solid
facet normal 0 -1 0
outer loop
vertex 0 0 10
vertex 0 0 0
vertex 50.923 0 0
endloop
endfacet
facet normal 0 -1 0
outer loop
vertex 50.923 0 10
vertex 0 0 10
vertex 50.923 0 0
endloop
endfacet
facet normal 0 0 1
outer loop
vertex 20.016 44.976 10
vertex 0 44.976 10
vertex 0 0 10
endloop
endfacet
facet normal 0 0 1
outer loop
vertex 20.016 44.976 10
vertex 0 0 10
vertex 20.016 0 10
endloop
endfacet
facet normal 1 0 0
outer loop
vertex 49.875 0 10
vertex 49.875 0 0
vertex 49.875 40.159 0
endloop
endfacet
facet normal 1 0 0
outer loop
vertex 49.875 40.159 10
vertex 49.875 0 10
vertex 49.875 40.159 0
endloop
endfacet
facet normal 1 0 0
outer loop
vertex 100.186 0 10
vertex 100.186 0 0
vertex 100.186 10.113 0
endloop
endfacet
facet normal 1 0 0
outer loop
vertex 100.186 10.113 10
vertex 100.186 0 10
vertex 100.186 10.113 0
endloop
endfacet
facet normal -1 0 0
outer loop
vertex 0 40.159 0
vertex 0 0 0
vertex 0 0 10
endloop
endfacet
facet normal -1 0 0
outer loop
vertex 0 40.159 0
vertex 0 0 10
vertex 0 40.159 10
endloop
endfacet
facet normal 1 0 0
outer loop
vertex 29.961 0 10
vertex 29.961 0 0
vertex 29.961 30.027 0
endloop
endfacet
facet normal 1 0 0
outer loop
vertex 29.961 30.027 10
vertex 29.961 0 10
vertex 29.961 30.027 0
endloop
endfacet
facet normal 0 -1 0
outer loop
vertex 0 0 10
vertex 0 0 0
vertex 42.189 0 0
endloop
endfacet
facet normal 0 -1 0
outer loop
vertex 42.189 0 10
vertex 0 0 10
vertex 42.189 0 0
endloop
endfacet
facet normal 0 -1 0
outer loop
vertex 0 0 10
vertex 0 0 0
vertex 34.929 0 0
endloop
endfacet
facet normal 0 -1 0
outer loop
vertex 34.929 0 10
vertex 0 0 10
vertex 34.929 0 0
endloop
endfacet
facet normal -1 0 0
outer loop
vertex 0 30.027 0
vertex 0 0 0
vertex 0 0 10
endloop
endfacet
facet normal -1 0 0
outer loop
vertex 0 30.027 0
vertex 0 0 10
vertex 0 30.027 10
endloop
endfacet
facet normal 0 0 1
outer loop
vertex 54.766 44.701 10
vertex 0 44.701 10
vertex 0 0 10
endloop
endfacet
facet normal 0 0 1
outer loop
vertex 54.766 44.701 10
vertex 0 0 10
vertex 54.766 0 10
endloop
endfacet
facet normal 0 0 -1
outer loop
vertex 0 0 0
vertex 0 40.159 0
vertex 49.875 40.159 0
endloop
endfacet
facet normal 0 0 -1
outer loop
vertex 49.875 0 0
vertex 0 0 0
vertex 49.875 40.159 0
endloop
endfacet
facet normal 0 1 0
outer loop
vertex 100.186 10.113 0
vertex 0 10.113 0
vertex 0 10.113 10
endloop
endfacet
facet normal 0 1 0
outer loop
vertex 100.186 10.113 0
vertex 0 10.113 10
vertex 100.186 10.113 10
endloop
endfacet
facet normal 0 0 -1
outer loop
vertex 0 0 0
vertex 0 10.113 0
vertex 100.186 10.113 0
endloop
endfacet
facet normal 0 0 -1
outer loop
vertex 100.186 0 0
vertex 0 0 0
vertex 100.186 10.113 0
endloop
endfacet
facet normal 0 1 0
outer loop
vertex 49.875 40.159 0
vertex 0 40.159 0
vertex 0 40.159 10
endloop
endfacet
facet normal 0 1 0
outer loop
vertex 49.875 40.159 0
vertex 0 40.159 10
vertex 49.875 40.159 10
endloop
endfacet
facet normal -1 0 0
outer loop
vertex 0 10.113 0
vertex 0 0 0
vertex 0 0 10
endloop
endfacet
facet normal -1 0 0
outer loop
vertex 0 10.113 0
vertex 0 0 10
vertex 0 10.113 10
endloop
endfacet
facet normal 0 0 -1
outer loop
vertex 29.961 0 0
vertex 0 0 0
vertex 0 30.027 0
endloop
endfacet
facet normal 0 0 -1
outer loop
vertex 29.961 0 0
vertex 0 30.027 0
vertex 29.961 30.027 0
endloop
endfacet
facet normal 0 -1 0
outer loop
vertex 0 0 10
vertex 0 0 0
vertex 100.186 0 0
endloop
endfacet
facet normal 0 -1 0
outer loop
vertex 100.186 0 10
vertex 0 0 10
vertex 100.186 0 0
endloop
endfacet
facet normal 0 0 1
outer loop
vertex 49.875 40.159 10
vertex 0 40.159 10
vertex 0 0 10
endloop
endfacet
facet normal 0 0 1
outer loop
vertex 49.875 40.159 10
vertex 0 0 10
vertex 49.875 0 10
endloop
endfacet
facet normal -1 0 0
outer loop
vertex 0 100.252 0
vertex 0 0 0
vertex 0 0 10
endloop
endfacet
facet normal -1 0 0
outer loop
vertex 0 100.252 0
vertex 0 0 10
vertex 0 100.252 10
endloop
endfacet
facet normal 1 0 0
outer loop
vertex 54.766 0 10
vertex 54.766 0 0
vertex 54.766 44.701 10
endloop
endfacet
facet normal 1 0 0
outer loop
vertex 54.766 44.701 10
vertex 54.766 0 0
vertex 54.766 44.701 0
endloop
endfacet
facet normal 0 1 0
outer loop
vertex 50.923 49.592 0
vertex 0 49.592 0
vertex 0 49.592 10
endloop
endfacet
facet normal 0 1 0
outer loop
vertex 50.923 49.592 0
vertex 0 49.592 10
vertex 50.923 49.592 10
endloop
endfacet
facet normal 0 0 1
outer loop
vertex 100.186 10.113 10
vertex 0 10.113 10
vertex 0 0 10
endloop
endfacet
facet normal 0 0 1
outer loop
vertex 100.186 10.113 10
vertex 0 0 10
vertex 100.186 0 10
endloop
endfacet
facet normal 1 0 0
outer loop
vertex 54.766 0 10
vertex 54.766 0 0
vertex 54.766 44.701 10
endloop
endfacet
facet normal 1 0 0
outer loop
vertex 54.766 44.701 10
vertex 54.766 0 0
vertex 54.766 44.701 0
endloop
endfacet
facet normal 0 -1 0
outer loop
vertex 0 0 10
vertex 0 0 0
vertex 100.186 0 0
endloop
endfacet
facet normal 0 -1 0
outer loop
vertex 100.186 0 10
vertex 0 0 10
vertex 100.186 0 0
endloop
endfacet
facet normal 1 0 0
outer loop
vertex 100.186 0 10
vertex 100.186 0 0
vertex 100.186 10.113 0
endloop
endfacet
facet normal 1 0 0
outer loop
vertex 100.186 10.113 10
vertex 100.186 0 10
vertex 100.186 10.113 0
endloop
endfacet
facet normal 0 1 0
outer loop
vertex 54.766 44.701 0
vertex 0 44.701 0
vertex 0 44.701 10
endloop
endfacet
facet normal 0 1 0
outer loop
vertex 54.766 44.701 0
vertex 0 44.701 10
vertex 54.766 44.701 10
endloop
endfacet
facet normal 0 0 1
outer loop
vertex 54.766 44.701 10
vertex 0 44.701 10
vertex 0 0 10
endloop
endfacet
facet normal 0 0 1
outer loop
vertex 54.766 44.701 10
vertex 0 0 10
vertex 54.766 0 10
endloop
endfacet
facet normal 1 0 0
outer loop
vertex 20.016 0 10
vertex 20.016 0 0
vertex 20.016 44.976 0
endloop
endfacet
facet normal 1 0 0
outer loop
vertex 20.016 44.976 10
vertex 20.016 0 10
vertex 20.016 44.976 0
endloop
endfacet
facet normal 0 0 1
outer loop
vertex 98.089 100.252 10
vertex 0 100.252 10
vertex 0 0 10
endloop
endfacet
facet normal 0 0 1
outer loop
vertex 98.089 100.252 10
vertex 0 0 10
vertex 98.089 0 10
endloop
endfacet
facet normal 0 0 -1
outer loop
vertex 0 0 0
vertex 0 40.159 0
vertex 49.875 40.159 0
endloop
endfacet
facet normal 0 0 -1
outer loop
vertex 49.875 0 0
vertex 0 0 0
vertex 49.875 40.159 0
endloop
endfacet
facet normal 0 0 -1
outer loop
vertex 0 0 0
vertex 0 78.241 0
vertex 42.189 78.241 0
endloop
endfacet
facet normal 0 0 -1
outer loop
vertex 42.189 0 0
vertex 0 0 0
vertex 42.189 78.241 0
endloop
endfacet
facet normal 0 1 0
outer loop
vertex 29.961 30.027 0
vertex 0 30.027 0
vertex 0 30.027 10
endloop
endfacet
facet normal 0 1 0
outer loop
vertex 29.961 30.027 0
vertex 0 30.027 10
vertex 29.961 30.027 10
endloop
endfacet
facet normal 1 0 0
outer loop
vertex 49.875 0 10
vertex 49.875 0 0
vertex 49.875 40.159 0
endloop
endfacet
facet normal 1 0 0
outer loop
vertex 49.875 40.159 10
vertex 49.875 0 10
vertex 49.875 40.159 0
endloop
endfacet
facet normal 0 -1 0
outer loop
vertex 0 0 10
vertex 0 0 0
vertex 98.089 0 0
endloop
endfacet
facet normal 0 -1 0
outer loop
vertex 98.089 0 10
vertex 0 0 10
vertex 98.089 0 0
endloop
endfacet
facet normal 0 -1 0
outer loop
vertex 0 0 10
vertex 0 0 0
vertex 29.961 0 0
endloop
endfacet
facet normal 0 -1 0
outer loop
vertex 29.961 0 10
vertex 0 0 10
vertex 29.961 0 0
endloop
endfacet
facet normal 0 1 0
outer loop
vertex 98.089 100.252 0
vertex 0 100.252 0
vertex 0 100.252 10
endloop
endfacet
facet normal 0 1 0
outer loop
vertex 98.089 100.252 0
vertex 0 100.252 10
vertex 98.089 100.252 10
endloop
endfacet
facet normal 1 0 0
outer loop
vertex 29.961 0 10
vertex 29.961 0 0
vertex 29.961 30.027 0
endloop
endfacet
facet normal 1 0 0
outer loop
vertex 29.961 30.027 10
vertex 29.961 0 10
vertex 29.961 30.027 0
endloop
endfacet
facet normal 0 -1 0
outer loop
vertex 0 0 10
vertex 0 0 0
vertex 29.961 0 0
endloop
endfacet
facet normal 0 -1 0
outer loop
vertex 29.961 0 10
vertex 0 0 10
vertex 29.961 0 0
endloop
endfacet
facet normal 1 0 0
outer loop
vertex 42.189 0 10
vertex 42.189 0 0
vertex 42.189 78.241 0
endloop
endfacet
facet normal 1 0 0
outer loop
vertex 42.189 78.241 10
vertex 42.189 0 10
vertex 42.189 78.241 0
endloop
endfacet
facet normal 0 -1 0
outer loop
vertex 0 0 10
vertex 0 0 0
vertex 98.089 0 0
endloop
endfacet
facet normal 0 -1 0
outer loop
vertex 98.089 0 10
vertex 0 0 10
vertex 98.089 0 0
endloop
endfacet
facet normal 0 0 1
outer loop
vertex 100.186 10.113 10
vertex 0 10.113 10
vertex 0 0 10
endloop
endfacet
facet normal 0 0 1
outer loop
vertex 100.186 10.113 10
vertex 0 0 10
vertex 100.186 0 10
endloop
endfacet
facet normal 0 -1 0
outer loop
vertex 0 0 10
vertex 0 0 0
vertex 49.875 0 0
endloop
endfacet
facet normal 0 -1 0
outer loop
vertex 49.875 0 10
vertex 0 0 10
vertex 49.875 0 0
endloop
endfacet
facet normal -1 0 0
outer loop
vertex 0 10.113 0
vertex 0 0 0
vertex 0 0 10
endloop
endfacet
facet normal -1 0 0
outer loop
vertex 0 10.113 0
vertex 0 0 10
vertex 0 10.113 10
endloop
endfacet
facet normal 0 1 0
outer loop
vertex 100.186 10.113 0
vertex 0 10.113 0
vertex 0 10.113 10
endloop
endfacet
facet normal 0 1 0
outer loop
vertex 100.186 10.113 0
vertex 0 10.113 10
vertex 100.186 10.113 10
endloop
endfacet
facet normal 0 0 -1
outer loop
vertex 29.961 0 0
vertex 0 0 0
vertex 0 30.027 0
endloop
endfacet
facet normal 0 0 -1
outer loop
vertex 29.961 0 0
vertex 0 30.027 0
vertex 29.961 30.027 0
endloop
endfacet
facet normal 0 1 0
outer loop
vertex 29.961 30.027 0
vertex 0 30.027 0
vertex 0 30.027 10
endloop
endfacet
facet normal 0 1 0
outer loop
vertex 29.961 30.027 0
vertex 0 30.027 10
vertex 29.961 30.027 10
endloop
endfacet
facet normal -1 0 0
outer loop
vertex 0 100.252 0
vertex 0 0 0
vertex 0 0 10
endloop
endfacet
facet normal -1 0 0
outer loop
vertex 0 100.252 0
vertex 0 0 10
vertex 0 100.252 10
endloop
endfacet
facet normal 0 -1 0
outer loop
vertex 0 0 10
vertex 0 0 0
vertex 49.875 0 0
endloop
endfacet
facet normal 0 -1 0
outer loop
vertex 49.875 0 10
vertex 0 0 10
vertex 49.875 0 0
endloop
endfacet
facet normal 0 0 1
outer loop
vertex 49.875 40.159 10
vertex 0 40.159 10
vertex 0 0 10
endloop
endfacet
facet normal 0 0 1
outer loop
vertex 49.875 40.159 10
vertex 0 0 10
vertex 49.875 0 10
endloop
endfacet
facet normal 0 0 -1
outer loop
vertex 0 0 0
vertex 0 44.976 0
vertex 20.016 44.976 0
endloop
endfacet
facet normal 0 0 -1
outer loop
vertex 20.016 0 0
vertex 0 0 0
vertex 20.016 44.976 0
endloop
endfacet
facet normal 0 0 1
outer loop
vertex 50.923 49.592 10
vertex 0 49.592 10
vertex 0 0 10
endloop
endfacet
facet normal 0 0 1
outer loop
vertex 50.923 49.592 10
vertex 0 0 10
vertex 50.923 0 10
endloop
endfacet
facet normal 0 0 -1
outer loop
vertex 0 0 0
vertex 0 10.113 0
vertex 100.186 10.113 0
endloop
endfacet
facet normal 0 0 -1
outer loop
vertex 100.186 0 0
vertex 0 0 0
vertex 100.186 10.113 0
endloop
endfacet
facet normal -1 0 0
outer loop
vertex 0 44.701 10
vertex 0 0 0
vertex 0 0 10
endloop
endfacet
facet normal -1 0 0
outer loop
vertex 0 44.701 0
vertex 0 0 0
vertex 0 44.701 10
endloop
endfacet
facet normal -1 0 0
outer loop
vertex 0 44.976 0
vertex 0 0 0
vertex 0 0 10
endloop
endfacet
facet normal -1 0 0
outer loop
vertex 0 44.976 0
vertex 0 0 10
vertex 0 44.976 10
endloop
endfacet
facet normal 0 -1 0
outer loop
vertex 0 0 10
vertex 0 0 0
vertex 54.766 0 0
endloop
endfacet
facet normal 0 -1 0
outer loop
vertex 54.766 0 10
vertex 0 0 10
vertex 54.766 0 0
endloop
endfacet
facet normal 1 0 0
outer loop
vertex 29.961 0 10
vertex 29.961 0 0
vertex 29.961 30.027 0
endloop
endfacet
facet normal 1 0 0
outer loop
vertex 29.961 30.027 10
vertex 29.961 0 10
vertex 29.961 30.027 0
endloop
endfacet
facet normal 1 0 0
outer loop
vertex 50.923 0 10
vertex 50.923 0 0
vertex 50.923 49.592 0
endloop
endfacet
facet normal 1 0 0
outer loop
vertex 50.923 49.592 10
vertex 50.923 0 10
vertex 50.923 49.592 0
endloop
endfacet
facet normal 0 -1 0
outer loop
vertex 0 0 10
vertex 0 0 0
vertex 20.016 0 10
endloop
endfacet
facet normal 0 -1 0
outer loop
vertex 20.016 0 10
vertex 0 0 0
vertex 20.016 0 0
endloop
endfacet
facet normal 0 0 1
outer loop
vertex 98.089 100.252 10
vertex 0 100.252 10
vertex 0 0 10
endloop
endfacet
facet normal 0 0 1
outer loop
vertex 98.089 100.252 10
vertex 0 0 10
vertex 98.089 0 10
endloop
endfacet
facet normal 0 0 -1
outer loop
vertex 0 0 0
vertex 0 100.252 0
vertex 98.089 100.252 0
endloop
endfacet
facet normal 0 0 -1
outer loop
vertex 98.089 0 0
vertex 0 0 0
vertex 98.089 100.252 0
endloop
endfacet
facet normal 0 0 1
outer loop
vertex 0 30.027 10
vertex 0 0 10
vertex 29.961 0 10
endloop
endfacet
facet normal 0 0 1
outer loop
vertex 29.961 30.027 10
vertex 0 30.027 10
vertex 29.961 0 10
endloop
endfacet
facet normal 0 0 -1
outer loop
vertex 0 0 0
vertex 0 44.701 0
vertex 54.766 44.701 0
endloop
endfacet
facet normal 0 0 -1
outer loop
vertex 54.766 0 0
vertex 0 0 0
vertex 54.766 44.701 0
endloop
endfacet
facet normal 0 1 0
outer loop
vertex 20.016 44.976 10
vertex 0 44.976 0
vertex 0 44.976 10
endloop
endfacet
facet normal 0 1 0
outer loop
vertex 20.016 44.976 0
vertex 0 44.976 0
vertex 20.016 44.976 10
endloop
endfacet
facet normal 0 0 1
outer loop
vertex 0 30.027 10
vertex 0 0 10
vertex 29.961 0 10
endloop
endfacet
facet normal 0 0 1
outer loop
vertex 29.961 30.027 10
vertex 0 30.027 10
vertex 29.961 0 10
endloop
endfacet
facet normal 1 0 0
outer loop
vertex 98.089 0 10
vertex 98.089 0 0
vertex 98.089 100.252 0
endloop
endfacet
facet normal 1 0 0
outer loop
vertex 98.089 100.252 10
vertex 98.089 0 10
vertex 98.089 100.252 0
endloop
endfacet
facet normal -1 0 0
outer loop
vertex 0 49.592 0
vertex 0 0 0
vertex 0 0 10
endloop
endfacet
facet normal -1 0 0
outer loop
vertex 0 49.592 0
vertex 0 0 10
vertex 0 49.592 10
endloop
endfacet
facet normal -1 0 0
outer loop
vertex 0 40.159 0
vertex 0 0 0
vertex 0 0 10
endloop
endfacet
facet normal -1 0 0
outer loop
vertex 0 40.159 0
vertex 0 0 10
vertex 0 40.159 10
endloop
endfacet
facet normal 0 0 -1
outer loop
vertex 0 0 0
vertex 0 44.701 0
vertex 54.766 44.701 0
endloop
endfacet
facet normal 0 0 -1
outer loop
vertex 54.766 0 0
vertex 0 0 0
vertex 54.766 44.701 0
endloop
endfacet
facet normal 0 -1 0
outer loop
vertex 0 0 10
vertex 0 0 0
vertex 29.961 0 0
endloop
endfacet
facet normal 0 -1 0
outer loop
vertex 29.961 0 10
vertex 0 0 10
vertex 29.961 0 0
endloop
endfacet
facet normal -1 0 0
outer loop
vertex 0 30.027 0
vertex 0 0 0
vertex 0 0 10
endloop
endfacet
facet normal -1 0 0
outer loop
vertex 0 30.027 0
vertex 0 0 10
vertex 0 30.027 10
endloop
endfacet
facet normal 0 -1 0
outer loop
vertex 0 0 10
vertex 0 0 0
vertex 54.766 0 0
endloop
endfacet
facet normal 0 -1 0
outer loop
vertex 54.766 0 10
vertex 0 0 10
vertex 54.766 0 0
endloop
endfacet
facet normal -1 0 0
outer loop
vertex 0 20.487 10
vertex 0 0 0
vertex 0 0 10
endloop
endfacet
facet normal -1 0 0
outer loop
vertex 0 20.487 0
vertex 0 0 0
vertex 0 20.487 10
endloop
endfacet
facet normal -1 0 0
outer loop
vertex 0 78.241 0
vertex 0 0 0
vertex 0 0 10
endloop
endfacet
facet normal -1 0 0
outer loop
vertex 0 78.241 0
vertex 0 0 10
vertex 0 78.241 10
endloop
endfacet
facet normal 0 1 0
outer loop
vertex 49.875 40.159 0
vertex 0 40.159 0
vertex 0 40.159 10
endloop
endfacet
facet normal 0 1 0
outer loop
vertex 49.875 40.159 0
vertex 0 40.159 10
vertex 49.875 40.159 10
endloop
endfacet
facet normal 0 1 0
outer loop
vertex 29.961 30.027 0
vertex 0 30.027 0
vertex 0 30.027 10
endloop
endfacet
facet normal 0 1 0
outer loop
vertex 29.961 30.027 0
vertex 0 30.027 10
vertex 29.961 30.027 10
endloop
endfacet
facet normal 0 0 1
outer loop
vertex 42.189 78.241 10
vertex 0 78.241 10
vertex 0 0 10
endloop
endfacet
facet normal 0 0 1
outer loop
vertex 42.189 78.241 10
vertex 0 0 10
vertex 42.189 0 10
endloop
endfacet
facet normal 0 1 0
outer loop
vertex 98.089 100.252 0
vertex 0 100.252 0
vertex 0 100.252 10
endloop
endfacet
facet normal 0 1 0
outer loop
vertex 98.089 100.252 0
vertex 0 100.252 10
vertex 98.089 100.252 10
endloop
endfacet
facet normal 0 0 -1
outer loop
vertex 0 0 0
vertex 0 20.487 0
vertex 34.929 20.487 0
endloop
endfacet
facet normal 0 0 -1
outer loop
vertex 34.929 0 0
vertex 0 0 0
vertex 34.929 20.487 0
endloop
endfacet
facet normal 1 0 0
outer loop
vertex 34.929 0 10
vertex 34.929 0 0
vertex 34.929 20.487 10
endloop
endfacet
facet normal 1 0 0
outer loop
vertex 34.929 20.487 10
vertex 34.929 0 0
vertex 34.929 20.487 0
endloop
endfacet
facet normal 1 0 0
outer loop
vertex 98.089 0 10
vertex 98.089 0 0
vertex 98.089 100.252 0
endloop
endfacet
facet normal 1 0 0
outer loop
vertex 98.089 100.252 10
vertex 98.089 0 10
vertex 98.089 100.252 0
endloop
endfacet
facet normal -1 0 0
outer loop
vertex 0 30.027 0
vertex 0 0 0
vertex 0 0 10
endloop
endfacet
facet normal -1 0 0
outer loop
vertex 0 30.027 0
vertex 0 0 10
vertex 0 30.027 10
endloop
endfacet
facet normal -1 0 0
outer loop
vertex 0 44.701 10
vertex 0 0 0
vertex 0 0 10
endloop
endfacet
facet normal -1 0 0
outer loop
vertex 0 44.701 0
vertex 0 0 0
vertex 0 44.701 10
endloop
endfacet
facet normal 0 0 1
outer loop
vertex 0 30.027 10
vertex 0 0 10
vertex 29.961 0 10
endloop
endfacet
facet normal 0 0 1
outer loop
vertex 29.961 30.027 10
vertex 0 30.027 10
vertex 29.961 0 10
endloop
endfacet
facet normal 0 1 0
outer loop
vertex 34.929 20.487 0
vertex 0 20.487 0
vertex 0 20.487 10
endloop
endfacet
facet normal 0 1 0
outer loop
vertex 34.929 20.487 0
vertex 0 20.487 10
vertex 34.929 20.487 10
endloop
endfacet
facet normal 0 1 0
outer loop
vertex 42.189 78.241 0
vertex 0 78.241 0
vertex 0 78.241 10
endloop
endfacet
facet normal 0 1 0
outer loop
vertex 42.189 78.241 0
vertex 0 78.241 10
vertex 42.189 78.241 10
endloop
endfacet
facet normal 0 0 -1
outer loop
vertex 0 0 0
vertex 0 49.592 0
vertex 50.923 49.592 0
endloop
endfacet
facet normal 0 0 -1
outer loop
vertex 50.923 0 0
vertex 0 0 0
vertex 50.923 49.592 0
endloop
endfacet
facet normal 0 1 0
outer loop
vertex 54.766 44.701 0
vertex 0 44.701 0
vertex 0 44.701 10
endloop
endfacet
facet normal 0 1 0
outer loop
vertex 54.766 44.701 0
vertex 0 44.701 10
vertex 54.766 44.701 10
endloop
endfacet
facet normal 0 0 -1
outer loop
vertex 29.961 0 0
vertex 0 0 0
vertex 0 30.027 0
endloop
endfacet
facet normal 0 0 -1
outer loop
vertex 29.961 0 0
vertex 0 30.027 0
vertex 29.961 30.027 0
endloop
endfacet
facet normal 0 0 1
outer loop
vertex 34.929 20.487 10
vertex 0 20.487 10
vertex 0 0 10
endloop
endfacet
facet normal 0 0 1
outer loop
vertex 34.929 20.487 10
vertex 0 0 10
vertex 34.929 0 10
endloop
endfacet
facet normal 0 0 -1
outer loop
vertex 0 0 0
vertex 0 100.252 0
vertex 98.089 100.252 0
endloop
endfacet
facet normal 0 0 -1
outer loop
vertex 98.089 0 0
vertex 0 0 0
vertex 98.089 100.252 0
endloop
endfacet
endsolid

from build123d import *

# Parameters (mm, degrees)
SKETCH_W     = 34.929359
SKETCH_H     = 20.486658
PAD_DEPTH    = 10
SKETCH001_W  = 20.015697
SKETCH001_H  = 44.976456
PAD001_DEPTH = 10
SKETCH002_W  = 29.960587
SKETCH002_H  = 30.027189
PAD002_DEPTH = 10
SKETCH003_W  = 54.766457
SKETCH003_H  = 44.701084
PAD003_DEPTH = 10
SKETCH004_W  = 42.188831
SKETCH004_H  = 78.241425
PAD004_DEPTH = 10
SKETCH005_W  = 100.185661
SKETCH005_H  = 10.112617
PAD005_DEPTH = 10
SKETCH006_W  = 49.87516
SKETCH006_H  = 40.159164
PAD006_DEPTH = 10
SKETCH007_W  = 98.089394
SKETCH007_H  = 100.252266
PAD007_DEPTH = 10
SKETCH008_W  = 50.923298
SKETCH008_H  = 49.592381
PAD008_DEPTH = 10
SKETCH009_W  = 29.960587
SKETCH009_H  = 30.027189
PAD009_DEPTH = 10
SKETCH010_W  = 49.87516
SKETCH010_H  = 40.159164
PAD010_DEPTH = 10
SKETCH011_W  = 54.766457
SKETCH011_H  = 44.701084
PAD011_DEPTH = 10
SKETCH012_W  = 29.960587
SKETCH012_H  = 30.027189
PAD012_DEPTH = 10
SKETCH013_W  = 100.185661
SKETCH013_H  = 10.112617
PAD013_DEPTH = 10
SKETCH014_W  = 98.089394
SKETCH014_H  = 100.252266
PAD014_DEPTH = 10


with BuildPart() as body:
    # Sketch → Pad (new body)
    with BuildSketch(Plane.XY):
        with Locations((17.464679, 10.243329)):
            Rectangle(SKETCH_W, SKETCH_H)
    extrude(amount=PAD_DEPTH)


with BuildPart() as body001:
    # Sketch001 → Pad001 (new body)
    with BuildSketch(Plane.XY):
        with Locations((10.007848, 22.488228)):
            Rectangle(SKETCH001_W, SKETCH001_H)
    extrude(amount=PAD001_DEPTH)


with BuildPart() as body002:
    # Sketch002 → Pad002 (new body)
    with BuildSketch(Plane.XY):
        with Locations((14.980294, 15.013594)):
            Rectangle(SKETCH002_W, SKETCH002_H)
    extrude(amount=PAD002_DEPTH)


with BuildPart() as body003:
    # Sketch003 → Pad003 (new body)
    with BuildSketch(Plane.XY):
        with Locations((27.383228, 22.350542)):
            Rectangle(SKETCH003_W, SKETCH003_H)
    extrude(amount=PAD003_DEPTH)


with BuildPart() as body004:
    # Sketch004 → Pad004 (new body)
    with BuildSketch(Plane.XY):
        with Locations((21.094416, 39.120712)):
            Rectangle(SKETCH004_W, SKETCH004_H)
    extrude(amount=PAD004_DEPTH)


with BuildPart() as body005:
    # Sketch005 → Pad005 (new body)
    with BuildSketch(Plane.XY):
        with Locations((50.09283, 5.056309)):
            Rectangle(SKETCH005_W, SKETCH005_H)
    extrude(amount=PAD005_DEPTH)


with BuildPart() as body006:
    # Sketch006 → Pad006 (new body)
    with BuildSketch(Plane.XY):
        with Locations((24.93758, 20.079582)):
            Rectangle(SKETCH006_W, SKETCH006_H)
    extrude(amount=PAD006_DEPTH)


with BuildPart() as body007:
    # Sketch007 → Pad007 (new body)
    with BuildSketch(Plane.XY):
        with Locations((49.044697, 50.126133)):
            Rectangle(SKETCH007_W, SKETCH007_H)
    extrude(amount=PAD007_DEPTH)


with BuildPart() as body008:
    # Sketch008 → Pad008 (new body)
    with BuildSketch(Plane.XY):
        with Locations((25.461649, 24.79619)):
            Rectangle(SKETCH008_W, SKETCH008_H)
    extrude(amount=PAD008_DEPTH)


with BuildPart() as body009:
    # Sketch009 → Pad009 (new body)
    with BuildSketch(Plane.XY):
        with Locations((14.980294, 15.013594)):
            Rectangle(SKETCH009_W, SKETCH009_H)
    extrude(amount=PAD009_DEPTH)


with BuildPart() as body010:
    # Sketch010 → Pad010 (new body)
    with BuildSketch(Plane.XY):
        with Locations((24.93758, 20.079582)):
            Rectangle(SKETCH010_W, SKETCH010_H)
    extrude(amount=PAD010_DEPTH)


with BuildPart() as body011:
    # Sketch011 → Pad011 (new body)
    with BuildSketch(Plane.XY):
        with Locations((27.383228, 22.350542)):
            Rectangle(SKETCH011_W, SKETCH011_H)
    extrude(amount=PAD011_DEPTH)


with BuildPart() as body012:
    # Sketch012 → Pad012 (new body)
    with BuildSketch(Plane.XY):
        with Locations((14.980294, 15.013594)):
            Rectangle(SKETCH012_W, SKETCH012_H)
    extrude(amount=PAD012_DEPTH)


with BuildPart() as body013:
    # Sketch013 → Pad013 (new body)
    with BuildSketch(Plane.XY):
        with Locations((50.09283, 5.056309)):
            Rectangle(SKETCH013_W, SKETCH013_H)
    extrude(amount=PAD013_DEPTH)


with BuildPart() as body014:
    # Sketch014 → Pad014 (new body)
    with BuildSketch(Plane.XY):
        with Locations((49.044697, 50.126133)):
            Rectangle(SKETCH014_W, SKETCH014_H)
    extrude(amount=PAD014_DEPTH)


solid = Compound([body.part, body001.part, body002.part, body003.part, body004.part, body005.part, body006.part, body007.part, body008.part, body009.part, body010.part, body011.part, body012.part, body013.part, body014.part])
